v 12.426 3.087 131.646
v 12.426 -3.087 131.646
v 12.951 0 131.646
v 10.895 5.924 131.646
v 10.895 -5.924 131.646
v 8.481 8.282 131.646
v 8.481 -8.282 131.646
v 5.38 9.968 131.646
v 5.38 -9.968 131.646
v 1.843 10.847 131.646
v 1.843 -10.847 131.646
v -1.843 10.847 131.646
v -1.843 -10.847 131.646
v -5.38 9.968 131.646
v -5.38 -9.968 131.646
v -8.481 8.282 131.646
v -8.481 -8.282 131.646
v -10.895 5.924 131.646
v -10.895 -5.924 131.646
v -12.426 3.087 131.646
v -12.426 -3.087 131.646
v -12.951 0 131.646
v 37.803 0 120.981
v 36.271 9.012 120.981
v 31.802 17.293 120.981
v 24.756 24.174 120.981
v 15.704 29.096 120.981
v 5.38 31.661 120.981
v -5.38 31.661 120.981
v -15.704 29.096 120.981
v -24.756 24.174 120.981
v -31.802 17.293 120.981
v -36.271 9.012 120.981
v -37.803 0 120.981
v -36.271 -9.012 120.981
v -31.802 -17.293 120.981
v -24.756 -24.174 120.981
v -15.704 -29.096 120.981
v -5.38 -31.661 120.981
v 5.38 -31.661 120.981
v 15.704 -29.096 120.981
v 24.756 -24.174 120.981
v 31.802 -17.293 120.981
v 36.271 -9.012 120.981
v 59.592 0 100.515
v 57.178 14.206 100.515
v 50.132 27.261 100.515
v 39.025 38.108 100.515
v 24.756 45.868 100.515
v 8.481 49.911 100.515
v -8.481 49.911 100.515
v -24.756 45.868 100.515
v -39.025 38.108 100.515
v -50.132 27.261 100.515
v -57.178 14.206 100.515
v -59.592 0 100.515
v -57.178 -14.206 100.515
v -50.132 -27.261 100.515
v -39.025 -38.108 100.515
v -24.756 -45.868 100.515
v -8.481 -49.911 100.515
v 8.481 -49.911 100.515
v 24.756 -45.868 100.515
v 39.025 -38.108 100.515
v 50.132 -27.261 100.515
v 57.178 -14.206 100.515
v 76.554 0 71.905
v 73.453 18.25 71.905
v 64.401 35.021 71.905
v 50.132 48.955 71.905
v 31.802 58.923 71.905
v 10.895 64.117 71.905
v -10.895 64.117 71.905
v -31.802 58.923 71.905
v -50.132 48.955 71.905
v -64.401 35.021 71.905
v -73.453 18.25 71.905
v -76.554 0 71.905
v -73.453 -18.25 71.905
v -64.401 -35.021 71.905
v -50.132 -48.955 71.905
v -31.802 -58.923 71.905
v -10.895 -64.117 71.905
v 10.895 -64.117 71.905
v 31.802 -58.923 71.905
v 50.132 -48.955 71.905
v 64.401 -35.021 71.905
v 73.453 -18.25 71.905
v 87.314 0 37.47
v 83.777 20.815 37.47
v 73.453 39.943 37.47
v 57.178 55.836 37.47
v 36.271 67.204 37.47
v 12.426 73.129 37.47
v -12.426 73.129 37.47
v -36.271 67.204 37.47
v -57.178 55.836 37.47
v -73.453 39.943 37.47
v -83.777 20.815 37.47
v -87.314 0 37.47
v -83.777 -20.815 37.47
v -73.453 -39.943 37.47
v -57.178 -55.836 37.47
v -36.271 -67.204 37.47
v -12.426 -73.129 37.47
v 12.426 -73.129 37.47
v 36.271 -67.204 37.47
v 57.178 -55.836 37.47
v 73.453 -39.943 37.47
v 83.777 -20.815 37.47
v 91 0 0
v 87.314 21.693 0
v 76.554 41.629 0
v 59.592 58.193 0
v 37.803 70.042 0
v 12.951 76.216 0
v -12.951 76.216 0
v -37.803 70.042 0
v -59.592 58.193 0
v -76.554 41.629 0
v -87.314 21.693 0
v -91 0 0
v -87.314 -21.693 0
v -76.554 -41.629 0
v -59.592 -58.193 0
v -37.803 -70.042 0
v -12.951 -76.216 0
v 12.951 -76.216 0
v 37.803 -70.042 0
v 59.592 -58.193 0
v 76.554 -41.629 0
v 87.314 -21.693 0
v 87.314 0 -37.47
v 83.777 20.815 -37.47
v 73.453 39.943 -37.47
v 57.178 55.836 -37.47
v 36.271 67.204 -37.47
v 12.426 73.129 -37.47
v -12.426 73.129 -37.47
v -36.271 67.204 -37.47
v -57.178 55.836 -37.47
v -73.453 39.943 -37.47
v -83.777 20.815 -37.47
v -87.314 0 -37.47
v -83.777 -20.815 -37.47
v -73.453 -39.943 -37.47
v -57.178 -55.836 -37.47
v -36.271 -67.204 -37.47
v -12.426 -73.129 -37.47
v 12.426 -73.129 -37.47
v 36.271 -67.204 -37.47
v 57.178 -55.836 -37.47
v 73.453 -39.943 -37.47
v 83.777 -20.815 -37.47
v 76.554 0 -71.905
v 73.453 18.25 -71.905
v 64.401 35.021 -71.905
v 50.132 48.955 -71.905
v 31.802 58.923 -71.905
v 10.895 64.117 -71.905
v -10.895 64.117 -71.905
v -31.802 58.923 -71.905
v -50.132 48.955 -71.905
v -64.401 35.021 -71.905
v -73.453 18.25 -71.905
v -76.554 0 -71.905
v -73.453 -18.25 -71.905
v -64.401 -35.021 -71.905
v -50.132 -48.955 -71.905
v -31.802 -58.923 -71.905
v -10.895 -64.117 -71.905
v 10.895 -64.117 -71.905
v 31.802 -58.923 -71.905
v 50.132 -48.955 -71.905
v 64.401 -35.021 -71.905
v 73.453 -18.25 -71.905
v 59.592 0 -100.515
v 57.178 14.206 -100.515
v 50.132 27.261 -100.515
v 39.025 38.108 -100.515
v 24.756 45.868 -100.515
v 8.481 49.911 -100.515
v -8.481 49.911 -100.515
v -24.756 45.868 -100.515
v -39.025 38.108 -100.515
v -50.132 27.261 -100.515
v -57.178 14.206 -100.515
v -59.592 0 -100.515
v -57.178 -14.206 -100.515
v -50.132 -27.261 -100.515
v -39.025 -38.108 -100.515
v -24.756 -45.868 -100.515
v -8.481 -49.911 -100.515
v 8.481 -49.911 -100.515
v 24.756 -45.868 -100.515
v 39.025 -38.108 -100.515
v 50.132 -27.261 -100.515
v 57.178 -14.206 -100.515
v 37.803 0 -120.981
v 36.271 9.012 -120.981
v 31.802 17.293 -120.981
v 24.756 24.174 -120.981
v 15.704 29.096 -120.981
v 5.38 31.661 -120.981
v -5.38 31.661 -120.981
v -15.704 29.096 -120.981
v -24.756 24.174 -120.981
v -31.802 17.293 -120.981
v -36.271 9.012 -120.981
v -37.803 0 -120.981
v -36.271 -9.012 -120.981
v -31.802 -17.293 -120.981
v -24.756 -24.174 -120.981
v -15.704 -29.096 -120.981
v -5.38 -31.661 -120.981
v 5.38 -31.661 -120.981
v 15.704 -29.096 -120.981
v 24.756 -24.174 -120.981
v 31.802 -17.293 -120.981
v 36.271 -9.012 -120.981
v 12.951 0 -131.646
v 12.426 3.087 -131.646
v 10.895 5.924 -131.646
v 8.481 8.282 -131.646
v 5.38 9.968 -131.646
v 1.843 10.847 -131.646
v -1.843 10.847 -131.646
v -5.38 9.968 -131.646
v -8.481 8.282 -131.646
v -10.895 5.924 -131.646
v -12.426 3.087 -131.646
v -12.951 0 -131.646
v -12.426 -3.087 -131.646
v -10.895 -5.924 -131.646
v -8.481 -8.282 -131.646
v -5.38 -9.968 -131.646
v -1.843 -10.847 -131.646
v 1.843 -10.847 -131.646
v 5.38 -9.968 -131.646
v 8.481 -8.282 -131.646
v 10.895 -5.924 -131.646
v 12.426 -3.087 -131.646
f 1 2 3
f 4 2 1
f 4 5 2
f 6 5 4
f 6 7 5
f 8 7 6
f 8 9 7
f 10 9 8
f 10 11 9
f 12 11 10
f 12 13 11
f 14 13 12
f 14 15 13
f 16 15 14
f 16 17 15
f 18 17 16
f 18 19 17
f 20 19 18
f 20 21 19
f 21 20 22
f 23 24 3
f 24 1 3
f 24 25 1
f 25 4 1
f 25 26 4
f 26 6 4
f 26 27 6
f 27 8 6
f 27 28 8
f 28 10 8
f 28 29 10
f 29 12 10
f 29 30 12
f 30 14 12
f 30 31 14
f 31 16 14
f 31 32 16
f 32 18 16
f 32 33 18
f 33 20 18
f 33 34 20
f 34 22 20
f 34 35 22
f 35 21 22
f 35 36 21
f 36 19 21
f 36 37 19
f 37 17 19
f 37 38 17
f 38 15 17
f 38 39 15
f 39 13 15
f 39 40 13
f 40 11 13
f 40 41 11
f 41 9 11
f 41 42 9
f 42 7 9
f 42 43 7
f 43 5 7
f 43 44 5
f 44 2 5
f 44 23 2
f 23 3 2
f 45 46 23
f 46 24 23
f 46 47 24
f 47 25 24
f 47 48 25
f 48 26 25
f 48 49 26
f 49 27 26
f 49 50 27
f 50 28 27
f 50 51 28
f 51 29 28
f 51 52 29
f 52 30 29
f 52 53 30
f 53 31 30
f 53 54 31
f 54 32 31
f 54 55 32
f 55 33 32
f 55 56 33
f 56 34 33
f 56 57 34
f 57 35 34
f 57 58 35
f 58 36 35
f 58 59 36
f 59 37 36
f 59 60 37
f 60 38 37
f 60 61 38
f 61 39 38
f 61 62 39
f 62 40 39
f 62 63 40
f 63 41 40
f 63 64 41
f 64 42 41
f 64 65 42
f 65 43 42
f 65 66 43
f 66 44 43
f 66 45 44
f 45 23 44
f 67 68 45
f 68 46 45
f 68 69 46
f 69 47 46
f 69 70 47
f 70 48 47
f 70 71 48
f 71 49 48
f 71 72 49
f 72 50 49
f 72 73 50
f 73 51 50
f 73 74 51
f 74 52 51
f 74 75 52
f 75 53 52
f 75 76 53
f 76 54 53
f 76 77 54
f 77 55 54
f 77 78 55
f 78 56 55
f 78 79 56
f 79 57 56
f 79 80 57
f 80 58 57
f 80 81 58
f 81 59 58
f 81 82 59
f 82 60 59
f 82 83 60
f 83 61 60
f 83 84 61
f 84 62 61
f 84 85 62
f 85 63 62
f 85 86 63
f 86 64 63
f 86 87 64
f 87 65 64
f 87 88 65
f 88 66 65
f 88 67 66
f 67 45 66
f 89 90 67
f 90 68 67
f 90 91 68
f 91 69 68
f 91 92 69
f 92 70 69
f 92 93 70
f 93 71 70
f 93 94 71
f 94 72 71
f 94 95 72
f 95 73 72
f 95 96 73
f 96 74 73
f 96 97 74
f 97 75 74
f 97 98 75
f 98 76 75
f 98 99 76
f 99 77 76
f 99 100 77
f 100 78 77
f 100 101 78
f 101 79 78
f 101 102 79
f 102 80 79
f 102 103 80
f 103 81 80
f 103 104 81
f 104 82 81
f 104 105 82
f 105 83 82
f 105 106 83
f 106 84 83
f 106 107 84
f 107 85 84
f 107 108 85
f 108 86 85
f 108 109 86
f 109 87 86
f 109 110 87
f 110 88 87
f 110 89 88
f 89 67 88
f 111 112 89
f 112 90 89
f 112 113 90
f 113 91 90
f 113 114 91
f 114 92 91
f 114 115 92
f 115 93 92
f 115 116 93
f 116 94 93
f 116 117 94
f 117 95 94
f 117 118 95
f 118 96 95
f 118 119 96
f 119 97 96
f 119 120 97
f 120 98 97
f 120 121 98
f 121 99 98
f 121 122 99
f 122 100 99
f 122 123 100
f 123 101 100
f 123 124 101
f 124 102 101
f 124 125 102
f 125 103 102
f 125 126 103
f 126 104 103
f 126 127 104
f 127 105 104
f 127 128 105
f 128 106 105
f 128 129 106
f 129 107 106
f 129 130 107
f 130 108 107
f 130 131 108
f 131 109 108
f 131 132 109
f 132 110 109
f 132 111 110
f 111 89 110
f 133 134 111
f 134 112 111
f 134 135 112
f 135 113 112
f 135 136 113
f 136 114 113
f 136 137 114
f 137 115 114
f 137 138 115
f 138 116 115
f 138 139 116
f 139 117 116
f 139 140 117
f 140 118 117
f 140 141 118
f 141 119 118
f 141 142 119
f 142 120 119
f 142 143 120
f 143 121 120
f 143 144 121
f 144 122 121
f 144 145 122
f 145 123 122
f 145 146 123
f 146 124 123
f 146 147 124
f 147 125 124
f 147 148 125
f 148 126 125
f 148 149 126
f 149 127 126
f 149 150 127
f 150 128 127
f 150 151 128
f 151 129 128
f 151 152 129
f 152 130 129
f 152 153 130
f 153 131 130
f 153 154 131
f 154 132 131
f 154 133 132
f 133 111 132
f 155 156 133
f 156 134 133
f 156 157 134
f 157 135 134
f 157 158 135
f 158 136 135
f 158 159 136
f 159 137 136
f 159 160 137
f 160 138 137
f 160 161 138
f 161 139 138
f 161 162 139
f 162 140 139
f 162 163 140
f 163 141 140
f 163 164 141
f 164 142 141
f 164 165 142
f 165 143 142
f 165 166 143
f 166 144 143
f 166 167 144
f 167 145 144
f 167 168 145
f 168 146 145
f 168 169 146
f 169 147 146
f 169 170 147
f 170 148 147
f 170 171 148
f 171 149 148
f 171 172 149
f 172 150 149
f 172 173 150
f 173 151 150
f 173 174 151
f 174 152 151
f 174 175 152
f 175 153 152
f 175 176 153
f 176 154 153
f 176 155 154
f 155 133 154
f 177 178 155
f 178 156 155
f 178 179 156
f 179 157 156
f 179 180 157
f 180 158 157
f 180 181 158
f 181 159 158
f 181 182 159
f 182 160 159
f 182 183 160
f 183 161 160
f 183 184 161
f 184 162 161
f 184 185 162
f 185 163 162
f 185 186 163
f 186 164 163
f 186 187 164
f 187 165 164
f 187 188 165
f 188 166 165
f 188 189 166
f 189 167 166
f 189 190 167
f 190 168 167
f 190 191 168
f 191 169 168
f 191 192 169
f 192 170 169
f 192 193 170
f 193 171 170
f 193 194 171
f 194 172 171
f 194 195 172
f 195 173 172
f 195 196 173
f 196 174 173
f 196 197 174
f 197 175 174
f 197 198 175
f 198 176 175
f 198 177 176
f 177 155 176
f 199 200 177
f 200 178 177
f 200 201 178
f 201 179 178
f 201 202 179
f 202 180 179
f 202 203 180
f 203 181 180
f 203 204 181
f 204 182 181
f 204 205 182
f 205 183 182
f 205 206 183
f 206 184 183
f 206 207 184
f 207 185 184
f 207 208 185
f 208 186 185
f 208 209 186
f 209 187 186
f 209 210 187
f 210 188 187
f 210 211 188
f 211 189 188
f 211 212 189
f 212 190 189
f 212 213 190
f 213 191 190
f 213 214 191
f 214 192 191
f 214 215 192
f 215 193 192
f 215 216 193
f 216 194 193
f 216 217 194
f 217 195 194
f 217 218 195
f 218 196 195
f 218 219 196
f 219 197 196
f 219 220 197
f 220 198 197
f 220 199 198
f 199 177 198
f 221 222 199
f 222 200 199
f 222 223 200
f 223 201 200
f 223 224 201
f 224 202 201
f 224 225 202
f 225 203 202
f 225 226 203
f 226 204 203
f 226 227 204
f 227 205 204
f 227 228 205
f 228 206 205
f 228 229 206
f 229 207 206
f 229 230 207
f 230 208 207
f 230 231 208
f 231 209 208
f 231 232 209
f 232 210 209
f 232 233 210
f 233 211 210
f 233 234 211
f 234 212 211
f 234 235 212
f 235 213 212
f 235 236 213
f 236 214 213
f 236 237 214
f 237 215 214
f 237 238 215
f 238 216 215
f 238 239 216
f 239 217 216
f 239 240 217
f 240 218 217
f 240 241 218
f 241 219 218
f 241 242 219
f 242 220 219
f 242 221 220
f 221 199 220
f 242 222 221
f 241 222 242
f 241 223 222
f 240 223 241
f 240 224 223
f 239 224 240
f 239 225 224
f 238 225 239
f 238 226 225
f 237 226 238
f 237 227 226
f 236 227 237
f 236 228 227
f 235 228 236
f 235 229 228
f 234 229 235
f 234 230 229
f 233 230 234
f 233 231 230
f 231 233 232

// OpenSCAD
// Generated by SolidPython 1.0.1 on 2020-07-29 00:46:51


scale(v = [13, 11, 19]) {
	sphere(r = 7);
}
/***********************************************
*********      SolidPython code:      **********
************************************************
 
# import packages: SolidPython
from solid import *
from solid.utils import *
from itertools import chain, combinations, permutations


class Resize:

    def __init__(self, scad_file):
        self.scad_file = scad_file
        #self.scad_file = import_scad(scad_file)
        # cone/cylinder param:
        self.r1 = 0
        self.r2 = 0
        self.h = 0
        # rectangular prism param:
        self.w = 0
        self.l = 0
        # ellipse param:
        self.r = 0

    # import OpenScad code (file name corresponds to shape)


    # classify shape + parameters
    def assign(self, param1, param2, param3):
        if self.scad_file == 'cone.scad':
            self.r1 = param1
            self.r2 = param2
            self.h = param3
        elif self.scad_file == 'cylinder.scad':
            self.r1 = param1
            self.r2 = param2
            self.h = param3
        elif self.scad_file == 'rectangularPrism.scad':
            self.h = param1
            self.l = param2
            self.w = param3
        else:
            self.r = param1
            self.h = param2

    # resize parameters
    def iterate(self):
        x = range(3, 20, 2)
        i = 1
        if self.scad_file == 'cone.scad':
            tempList = list(permutations(x, 2))
            for temp in tempList:
                param1 = temp[0]
                param2 = temp[1]
                filepath = 'produced_scad_files/' + 'cone' + str(param1) + '_' + str(param2) + '_' + '.scad'
                scad_render_to_file(cylinder(h=param1, r1=param2, r2=0), filepath)

        elif self.scad_file == 'cylinder.scad':
            tempList = list(permutations(x, 3))
            for temp in tempList:
                param1 = temp[0]
                param2 = temp[1]
                filepath = 'produced_scad_files/' + 'cylinder' + str(param1) + '_' + str(param2) + '_' + '.scad'
                scad_render_to_file(cylinder(h=param1, r1=param2, r2=param2), filepath)

        elif self.scad_file == 'rectangularPrism.scad':
            tempList = list(permutations(x, 3))
            for temp in tempList:
                param1 = temp[0]
                param2 = temp[1]
                param3 = temp[2]
                filepath = 'produced_scad_files/' + 'rectangularPrism' + str(param1) + '_' + str(param2) + '_' + str(
                    param3) + '.scad'
                scad_render_to_file(cube(size=(param1, param2, param3)), filepath)

        elif self.scad_file == 'ellipse.scad':
            tempList = list(permutations(x, 4))
            for temp in tempList:
                param1 = temp[0]
                param2 = temp[1]
                param3 = temp[2]
                param4 = temp[3]
                filepath = 'produced_scad_files/' + 'ellipse' + str(param1) + '_' + str(param2) + '_' + str(param3) + '_' + str(param4) + '.scad'
                scad_render_to_file(scale([param1, param2, param3])(sphere(r=param4)), filepath)

    def render_to_scadfile(self):
        scad_render_to_file(scad, 'example.scad') 
 
************************************************/
